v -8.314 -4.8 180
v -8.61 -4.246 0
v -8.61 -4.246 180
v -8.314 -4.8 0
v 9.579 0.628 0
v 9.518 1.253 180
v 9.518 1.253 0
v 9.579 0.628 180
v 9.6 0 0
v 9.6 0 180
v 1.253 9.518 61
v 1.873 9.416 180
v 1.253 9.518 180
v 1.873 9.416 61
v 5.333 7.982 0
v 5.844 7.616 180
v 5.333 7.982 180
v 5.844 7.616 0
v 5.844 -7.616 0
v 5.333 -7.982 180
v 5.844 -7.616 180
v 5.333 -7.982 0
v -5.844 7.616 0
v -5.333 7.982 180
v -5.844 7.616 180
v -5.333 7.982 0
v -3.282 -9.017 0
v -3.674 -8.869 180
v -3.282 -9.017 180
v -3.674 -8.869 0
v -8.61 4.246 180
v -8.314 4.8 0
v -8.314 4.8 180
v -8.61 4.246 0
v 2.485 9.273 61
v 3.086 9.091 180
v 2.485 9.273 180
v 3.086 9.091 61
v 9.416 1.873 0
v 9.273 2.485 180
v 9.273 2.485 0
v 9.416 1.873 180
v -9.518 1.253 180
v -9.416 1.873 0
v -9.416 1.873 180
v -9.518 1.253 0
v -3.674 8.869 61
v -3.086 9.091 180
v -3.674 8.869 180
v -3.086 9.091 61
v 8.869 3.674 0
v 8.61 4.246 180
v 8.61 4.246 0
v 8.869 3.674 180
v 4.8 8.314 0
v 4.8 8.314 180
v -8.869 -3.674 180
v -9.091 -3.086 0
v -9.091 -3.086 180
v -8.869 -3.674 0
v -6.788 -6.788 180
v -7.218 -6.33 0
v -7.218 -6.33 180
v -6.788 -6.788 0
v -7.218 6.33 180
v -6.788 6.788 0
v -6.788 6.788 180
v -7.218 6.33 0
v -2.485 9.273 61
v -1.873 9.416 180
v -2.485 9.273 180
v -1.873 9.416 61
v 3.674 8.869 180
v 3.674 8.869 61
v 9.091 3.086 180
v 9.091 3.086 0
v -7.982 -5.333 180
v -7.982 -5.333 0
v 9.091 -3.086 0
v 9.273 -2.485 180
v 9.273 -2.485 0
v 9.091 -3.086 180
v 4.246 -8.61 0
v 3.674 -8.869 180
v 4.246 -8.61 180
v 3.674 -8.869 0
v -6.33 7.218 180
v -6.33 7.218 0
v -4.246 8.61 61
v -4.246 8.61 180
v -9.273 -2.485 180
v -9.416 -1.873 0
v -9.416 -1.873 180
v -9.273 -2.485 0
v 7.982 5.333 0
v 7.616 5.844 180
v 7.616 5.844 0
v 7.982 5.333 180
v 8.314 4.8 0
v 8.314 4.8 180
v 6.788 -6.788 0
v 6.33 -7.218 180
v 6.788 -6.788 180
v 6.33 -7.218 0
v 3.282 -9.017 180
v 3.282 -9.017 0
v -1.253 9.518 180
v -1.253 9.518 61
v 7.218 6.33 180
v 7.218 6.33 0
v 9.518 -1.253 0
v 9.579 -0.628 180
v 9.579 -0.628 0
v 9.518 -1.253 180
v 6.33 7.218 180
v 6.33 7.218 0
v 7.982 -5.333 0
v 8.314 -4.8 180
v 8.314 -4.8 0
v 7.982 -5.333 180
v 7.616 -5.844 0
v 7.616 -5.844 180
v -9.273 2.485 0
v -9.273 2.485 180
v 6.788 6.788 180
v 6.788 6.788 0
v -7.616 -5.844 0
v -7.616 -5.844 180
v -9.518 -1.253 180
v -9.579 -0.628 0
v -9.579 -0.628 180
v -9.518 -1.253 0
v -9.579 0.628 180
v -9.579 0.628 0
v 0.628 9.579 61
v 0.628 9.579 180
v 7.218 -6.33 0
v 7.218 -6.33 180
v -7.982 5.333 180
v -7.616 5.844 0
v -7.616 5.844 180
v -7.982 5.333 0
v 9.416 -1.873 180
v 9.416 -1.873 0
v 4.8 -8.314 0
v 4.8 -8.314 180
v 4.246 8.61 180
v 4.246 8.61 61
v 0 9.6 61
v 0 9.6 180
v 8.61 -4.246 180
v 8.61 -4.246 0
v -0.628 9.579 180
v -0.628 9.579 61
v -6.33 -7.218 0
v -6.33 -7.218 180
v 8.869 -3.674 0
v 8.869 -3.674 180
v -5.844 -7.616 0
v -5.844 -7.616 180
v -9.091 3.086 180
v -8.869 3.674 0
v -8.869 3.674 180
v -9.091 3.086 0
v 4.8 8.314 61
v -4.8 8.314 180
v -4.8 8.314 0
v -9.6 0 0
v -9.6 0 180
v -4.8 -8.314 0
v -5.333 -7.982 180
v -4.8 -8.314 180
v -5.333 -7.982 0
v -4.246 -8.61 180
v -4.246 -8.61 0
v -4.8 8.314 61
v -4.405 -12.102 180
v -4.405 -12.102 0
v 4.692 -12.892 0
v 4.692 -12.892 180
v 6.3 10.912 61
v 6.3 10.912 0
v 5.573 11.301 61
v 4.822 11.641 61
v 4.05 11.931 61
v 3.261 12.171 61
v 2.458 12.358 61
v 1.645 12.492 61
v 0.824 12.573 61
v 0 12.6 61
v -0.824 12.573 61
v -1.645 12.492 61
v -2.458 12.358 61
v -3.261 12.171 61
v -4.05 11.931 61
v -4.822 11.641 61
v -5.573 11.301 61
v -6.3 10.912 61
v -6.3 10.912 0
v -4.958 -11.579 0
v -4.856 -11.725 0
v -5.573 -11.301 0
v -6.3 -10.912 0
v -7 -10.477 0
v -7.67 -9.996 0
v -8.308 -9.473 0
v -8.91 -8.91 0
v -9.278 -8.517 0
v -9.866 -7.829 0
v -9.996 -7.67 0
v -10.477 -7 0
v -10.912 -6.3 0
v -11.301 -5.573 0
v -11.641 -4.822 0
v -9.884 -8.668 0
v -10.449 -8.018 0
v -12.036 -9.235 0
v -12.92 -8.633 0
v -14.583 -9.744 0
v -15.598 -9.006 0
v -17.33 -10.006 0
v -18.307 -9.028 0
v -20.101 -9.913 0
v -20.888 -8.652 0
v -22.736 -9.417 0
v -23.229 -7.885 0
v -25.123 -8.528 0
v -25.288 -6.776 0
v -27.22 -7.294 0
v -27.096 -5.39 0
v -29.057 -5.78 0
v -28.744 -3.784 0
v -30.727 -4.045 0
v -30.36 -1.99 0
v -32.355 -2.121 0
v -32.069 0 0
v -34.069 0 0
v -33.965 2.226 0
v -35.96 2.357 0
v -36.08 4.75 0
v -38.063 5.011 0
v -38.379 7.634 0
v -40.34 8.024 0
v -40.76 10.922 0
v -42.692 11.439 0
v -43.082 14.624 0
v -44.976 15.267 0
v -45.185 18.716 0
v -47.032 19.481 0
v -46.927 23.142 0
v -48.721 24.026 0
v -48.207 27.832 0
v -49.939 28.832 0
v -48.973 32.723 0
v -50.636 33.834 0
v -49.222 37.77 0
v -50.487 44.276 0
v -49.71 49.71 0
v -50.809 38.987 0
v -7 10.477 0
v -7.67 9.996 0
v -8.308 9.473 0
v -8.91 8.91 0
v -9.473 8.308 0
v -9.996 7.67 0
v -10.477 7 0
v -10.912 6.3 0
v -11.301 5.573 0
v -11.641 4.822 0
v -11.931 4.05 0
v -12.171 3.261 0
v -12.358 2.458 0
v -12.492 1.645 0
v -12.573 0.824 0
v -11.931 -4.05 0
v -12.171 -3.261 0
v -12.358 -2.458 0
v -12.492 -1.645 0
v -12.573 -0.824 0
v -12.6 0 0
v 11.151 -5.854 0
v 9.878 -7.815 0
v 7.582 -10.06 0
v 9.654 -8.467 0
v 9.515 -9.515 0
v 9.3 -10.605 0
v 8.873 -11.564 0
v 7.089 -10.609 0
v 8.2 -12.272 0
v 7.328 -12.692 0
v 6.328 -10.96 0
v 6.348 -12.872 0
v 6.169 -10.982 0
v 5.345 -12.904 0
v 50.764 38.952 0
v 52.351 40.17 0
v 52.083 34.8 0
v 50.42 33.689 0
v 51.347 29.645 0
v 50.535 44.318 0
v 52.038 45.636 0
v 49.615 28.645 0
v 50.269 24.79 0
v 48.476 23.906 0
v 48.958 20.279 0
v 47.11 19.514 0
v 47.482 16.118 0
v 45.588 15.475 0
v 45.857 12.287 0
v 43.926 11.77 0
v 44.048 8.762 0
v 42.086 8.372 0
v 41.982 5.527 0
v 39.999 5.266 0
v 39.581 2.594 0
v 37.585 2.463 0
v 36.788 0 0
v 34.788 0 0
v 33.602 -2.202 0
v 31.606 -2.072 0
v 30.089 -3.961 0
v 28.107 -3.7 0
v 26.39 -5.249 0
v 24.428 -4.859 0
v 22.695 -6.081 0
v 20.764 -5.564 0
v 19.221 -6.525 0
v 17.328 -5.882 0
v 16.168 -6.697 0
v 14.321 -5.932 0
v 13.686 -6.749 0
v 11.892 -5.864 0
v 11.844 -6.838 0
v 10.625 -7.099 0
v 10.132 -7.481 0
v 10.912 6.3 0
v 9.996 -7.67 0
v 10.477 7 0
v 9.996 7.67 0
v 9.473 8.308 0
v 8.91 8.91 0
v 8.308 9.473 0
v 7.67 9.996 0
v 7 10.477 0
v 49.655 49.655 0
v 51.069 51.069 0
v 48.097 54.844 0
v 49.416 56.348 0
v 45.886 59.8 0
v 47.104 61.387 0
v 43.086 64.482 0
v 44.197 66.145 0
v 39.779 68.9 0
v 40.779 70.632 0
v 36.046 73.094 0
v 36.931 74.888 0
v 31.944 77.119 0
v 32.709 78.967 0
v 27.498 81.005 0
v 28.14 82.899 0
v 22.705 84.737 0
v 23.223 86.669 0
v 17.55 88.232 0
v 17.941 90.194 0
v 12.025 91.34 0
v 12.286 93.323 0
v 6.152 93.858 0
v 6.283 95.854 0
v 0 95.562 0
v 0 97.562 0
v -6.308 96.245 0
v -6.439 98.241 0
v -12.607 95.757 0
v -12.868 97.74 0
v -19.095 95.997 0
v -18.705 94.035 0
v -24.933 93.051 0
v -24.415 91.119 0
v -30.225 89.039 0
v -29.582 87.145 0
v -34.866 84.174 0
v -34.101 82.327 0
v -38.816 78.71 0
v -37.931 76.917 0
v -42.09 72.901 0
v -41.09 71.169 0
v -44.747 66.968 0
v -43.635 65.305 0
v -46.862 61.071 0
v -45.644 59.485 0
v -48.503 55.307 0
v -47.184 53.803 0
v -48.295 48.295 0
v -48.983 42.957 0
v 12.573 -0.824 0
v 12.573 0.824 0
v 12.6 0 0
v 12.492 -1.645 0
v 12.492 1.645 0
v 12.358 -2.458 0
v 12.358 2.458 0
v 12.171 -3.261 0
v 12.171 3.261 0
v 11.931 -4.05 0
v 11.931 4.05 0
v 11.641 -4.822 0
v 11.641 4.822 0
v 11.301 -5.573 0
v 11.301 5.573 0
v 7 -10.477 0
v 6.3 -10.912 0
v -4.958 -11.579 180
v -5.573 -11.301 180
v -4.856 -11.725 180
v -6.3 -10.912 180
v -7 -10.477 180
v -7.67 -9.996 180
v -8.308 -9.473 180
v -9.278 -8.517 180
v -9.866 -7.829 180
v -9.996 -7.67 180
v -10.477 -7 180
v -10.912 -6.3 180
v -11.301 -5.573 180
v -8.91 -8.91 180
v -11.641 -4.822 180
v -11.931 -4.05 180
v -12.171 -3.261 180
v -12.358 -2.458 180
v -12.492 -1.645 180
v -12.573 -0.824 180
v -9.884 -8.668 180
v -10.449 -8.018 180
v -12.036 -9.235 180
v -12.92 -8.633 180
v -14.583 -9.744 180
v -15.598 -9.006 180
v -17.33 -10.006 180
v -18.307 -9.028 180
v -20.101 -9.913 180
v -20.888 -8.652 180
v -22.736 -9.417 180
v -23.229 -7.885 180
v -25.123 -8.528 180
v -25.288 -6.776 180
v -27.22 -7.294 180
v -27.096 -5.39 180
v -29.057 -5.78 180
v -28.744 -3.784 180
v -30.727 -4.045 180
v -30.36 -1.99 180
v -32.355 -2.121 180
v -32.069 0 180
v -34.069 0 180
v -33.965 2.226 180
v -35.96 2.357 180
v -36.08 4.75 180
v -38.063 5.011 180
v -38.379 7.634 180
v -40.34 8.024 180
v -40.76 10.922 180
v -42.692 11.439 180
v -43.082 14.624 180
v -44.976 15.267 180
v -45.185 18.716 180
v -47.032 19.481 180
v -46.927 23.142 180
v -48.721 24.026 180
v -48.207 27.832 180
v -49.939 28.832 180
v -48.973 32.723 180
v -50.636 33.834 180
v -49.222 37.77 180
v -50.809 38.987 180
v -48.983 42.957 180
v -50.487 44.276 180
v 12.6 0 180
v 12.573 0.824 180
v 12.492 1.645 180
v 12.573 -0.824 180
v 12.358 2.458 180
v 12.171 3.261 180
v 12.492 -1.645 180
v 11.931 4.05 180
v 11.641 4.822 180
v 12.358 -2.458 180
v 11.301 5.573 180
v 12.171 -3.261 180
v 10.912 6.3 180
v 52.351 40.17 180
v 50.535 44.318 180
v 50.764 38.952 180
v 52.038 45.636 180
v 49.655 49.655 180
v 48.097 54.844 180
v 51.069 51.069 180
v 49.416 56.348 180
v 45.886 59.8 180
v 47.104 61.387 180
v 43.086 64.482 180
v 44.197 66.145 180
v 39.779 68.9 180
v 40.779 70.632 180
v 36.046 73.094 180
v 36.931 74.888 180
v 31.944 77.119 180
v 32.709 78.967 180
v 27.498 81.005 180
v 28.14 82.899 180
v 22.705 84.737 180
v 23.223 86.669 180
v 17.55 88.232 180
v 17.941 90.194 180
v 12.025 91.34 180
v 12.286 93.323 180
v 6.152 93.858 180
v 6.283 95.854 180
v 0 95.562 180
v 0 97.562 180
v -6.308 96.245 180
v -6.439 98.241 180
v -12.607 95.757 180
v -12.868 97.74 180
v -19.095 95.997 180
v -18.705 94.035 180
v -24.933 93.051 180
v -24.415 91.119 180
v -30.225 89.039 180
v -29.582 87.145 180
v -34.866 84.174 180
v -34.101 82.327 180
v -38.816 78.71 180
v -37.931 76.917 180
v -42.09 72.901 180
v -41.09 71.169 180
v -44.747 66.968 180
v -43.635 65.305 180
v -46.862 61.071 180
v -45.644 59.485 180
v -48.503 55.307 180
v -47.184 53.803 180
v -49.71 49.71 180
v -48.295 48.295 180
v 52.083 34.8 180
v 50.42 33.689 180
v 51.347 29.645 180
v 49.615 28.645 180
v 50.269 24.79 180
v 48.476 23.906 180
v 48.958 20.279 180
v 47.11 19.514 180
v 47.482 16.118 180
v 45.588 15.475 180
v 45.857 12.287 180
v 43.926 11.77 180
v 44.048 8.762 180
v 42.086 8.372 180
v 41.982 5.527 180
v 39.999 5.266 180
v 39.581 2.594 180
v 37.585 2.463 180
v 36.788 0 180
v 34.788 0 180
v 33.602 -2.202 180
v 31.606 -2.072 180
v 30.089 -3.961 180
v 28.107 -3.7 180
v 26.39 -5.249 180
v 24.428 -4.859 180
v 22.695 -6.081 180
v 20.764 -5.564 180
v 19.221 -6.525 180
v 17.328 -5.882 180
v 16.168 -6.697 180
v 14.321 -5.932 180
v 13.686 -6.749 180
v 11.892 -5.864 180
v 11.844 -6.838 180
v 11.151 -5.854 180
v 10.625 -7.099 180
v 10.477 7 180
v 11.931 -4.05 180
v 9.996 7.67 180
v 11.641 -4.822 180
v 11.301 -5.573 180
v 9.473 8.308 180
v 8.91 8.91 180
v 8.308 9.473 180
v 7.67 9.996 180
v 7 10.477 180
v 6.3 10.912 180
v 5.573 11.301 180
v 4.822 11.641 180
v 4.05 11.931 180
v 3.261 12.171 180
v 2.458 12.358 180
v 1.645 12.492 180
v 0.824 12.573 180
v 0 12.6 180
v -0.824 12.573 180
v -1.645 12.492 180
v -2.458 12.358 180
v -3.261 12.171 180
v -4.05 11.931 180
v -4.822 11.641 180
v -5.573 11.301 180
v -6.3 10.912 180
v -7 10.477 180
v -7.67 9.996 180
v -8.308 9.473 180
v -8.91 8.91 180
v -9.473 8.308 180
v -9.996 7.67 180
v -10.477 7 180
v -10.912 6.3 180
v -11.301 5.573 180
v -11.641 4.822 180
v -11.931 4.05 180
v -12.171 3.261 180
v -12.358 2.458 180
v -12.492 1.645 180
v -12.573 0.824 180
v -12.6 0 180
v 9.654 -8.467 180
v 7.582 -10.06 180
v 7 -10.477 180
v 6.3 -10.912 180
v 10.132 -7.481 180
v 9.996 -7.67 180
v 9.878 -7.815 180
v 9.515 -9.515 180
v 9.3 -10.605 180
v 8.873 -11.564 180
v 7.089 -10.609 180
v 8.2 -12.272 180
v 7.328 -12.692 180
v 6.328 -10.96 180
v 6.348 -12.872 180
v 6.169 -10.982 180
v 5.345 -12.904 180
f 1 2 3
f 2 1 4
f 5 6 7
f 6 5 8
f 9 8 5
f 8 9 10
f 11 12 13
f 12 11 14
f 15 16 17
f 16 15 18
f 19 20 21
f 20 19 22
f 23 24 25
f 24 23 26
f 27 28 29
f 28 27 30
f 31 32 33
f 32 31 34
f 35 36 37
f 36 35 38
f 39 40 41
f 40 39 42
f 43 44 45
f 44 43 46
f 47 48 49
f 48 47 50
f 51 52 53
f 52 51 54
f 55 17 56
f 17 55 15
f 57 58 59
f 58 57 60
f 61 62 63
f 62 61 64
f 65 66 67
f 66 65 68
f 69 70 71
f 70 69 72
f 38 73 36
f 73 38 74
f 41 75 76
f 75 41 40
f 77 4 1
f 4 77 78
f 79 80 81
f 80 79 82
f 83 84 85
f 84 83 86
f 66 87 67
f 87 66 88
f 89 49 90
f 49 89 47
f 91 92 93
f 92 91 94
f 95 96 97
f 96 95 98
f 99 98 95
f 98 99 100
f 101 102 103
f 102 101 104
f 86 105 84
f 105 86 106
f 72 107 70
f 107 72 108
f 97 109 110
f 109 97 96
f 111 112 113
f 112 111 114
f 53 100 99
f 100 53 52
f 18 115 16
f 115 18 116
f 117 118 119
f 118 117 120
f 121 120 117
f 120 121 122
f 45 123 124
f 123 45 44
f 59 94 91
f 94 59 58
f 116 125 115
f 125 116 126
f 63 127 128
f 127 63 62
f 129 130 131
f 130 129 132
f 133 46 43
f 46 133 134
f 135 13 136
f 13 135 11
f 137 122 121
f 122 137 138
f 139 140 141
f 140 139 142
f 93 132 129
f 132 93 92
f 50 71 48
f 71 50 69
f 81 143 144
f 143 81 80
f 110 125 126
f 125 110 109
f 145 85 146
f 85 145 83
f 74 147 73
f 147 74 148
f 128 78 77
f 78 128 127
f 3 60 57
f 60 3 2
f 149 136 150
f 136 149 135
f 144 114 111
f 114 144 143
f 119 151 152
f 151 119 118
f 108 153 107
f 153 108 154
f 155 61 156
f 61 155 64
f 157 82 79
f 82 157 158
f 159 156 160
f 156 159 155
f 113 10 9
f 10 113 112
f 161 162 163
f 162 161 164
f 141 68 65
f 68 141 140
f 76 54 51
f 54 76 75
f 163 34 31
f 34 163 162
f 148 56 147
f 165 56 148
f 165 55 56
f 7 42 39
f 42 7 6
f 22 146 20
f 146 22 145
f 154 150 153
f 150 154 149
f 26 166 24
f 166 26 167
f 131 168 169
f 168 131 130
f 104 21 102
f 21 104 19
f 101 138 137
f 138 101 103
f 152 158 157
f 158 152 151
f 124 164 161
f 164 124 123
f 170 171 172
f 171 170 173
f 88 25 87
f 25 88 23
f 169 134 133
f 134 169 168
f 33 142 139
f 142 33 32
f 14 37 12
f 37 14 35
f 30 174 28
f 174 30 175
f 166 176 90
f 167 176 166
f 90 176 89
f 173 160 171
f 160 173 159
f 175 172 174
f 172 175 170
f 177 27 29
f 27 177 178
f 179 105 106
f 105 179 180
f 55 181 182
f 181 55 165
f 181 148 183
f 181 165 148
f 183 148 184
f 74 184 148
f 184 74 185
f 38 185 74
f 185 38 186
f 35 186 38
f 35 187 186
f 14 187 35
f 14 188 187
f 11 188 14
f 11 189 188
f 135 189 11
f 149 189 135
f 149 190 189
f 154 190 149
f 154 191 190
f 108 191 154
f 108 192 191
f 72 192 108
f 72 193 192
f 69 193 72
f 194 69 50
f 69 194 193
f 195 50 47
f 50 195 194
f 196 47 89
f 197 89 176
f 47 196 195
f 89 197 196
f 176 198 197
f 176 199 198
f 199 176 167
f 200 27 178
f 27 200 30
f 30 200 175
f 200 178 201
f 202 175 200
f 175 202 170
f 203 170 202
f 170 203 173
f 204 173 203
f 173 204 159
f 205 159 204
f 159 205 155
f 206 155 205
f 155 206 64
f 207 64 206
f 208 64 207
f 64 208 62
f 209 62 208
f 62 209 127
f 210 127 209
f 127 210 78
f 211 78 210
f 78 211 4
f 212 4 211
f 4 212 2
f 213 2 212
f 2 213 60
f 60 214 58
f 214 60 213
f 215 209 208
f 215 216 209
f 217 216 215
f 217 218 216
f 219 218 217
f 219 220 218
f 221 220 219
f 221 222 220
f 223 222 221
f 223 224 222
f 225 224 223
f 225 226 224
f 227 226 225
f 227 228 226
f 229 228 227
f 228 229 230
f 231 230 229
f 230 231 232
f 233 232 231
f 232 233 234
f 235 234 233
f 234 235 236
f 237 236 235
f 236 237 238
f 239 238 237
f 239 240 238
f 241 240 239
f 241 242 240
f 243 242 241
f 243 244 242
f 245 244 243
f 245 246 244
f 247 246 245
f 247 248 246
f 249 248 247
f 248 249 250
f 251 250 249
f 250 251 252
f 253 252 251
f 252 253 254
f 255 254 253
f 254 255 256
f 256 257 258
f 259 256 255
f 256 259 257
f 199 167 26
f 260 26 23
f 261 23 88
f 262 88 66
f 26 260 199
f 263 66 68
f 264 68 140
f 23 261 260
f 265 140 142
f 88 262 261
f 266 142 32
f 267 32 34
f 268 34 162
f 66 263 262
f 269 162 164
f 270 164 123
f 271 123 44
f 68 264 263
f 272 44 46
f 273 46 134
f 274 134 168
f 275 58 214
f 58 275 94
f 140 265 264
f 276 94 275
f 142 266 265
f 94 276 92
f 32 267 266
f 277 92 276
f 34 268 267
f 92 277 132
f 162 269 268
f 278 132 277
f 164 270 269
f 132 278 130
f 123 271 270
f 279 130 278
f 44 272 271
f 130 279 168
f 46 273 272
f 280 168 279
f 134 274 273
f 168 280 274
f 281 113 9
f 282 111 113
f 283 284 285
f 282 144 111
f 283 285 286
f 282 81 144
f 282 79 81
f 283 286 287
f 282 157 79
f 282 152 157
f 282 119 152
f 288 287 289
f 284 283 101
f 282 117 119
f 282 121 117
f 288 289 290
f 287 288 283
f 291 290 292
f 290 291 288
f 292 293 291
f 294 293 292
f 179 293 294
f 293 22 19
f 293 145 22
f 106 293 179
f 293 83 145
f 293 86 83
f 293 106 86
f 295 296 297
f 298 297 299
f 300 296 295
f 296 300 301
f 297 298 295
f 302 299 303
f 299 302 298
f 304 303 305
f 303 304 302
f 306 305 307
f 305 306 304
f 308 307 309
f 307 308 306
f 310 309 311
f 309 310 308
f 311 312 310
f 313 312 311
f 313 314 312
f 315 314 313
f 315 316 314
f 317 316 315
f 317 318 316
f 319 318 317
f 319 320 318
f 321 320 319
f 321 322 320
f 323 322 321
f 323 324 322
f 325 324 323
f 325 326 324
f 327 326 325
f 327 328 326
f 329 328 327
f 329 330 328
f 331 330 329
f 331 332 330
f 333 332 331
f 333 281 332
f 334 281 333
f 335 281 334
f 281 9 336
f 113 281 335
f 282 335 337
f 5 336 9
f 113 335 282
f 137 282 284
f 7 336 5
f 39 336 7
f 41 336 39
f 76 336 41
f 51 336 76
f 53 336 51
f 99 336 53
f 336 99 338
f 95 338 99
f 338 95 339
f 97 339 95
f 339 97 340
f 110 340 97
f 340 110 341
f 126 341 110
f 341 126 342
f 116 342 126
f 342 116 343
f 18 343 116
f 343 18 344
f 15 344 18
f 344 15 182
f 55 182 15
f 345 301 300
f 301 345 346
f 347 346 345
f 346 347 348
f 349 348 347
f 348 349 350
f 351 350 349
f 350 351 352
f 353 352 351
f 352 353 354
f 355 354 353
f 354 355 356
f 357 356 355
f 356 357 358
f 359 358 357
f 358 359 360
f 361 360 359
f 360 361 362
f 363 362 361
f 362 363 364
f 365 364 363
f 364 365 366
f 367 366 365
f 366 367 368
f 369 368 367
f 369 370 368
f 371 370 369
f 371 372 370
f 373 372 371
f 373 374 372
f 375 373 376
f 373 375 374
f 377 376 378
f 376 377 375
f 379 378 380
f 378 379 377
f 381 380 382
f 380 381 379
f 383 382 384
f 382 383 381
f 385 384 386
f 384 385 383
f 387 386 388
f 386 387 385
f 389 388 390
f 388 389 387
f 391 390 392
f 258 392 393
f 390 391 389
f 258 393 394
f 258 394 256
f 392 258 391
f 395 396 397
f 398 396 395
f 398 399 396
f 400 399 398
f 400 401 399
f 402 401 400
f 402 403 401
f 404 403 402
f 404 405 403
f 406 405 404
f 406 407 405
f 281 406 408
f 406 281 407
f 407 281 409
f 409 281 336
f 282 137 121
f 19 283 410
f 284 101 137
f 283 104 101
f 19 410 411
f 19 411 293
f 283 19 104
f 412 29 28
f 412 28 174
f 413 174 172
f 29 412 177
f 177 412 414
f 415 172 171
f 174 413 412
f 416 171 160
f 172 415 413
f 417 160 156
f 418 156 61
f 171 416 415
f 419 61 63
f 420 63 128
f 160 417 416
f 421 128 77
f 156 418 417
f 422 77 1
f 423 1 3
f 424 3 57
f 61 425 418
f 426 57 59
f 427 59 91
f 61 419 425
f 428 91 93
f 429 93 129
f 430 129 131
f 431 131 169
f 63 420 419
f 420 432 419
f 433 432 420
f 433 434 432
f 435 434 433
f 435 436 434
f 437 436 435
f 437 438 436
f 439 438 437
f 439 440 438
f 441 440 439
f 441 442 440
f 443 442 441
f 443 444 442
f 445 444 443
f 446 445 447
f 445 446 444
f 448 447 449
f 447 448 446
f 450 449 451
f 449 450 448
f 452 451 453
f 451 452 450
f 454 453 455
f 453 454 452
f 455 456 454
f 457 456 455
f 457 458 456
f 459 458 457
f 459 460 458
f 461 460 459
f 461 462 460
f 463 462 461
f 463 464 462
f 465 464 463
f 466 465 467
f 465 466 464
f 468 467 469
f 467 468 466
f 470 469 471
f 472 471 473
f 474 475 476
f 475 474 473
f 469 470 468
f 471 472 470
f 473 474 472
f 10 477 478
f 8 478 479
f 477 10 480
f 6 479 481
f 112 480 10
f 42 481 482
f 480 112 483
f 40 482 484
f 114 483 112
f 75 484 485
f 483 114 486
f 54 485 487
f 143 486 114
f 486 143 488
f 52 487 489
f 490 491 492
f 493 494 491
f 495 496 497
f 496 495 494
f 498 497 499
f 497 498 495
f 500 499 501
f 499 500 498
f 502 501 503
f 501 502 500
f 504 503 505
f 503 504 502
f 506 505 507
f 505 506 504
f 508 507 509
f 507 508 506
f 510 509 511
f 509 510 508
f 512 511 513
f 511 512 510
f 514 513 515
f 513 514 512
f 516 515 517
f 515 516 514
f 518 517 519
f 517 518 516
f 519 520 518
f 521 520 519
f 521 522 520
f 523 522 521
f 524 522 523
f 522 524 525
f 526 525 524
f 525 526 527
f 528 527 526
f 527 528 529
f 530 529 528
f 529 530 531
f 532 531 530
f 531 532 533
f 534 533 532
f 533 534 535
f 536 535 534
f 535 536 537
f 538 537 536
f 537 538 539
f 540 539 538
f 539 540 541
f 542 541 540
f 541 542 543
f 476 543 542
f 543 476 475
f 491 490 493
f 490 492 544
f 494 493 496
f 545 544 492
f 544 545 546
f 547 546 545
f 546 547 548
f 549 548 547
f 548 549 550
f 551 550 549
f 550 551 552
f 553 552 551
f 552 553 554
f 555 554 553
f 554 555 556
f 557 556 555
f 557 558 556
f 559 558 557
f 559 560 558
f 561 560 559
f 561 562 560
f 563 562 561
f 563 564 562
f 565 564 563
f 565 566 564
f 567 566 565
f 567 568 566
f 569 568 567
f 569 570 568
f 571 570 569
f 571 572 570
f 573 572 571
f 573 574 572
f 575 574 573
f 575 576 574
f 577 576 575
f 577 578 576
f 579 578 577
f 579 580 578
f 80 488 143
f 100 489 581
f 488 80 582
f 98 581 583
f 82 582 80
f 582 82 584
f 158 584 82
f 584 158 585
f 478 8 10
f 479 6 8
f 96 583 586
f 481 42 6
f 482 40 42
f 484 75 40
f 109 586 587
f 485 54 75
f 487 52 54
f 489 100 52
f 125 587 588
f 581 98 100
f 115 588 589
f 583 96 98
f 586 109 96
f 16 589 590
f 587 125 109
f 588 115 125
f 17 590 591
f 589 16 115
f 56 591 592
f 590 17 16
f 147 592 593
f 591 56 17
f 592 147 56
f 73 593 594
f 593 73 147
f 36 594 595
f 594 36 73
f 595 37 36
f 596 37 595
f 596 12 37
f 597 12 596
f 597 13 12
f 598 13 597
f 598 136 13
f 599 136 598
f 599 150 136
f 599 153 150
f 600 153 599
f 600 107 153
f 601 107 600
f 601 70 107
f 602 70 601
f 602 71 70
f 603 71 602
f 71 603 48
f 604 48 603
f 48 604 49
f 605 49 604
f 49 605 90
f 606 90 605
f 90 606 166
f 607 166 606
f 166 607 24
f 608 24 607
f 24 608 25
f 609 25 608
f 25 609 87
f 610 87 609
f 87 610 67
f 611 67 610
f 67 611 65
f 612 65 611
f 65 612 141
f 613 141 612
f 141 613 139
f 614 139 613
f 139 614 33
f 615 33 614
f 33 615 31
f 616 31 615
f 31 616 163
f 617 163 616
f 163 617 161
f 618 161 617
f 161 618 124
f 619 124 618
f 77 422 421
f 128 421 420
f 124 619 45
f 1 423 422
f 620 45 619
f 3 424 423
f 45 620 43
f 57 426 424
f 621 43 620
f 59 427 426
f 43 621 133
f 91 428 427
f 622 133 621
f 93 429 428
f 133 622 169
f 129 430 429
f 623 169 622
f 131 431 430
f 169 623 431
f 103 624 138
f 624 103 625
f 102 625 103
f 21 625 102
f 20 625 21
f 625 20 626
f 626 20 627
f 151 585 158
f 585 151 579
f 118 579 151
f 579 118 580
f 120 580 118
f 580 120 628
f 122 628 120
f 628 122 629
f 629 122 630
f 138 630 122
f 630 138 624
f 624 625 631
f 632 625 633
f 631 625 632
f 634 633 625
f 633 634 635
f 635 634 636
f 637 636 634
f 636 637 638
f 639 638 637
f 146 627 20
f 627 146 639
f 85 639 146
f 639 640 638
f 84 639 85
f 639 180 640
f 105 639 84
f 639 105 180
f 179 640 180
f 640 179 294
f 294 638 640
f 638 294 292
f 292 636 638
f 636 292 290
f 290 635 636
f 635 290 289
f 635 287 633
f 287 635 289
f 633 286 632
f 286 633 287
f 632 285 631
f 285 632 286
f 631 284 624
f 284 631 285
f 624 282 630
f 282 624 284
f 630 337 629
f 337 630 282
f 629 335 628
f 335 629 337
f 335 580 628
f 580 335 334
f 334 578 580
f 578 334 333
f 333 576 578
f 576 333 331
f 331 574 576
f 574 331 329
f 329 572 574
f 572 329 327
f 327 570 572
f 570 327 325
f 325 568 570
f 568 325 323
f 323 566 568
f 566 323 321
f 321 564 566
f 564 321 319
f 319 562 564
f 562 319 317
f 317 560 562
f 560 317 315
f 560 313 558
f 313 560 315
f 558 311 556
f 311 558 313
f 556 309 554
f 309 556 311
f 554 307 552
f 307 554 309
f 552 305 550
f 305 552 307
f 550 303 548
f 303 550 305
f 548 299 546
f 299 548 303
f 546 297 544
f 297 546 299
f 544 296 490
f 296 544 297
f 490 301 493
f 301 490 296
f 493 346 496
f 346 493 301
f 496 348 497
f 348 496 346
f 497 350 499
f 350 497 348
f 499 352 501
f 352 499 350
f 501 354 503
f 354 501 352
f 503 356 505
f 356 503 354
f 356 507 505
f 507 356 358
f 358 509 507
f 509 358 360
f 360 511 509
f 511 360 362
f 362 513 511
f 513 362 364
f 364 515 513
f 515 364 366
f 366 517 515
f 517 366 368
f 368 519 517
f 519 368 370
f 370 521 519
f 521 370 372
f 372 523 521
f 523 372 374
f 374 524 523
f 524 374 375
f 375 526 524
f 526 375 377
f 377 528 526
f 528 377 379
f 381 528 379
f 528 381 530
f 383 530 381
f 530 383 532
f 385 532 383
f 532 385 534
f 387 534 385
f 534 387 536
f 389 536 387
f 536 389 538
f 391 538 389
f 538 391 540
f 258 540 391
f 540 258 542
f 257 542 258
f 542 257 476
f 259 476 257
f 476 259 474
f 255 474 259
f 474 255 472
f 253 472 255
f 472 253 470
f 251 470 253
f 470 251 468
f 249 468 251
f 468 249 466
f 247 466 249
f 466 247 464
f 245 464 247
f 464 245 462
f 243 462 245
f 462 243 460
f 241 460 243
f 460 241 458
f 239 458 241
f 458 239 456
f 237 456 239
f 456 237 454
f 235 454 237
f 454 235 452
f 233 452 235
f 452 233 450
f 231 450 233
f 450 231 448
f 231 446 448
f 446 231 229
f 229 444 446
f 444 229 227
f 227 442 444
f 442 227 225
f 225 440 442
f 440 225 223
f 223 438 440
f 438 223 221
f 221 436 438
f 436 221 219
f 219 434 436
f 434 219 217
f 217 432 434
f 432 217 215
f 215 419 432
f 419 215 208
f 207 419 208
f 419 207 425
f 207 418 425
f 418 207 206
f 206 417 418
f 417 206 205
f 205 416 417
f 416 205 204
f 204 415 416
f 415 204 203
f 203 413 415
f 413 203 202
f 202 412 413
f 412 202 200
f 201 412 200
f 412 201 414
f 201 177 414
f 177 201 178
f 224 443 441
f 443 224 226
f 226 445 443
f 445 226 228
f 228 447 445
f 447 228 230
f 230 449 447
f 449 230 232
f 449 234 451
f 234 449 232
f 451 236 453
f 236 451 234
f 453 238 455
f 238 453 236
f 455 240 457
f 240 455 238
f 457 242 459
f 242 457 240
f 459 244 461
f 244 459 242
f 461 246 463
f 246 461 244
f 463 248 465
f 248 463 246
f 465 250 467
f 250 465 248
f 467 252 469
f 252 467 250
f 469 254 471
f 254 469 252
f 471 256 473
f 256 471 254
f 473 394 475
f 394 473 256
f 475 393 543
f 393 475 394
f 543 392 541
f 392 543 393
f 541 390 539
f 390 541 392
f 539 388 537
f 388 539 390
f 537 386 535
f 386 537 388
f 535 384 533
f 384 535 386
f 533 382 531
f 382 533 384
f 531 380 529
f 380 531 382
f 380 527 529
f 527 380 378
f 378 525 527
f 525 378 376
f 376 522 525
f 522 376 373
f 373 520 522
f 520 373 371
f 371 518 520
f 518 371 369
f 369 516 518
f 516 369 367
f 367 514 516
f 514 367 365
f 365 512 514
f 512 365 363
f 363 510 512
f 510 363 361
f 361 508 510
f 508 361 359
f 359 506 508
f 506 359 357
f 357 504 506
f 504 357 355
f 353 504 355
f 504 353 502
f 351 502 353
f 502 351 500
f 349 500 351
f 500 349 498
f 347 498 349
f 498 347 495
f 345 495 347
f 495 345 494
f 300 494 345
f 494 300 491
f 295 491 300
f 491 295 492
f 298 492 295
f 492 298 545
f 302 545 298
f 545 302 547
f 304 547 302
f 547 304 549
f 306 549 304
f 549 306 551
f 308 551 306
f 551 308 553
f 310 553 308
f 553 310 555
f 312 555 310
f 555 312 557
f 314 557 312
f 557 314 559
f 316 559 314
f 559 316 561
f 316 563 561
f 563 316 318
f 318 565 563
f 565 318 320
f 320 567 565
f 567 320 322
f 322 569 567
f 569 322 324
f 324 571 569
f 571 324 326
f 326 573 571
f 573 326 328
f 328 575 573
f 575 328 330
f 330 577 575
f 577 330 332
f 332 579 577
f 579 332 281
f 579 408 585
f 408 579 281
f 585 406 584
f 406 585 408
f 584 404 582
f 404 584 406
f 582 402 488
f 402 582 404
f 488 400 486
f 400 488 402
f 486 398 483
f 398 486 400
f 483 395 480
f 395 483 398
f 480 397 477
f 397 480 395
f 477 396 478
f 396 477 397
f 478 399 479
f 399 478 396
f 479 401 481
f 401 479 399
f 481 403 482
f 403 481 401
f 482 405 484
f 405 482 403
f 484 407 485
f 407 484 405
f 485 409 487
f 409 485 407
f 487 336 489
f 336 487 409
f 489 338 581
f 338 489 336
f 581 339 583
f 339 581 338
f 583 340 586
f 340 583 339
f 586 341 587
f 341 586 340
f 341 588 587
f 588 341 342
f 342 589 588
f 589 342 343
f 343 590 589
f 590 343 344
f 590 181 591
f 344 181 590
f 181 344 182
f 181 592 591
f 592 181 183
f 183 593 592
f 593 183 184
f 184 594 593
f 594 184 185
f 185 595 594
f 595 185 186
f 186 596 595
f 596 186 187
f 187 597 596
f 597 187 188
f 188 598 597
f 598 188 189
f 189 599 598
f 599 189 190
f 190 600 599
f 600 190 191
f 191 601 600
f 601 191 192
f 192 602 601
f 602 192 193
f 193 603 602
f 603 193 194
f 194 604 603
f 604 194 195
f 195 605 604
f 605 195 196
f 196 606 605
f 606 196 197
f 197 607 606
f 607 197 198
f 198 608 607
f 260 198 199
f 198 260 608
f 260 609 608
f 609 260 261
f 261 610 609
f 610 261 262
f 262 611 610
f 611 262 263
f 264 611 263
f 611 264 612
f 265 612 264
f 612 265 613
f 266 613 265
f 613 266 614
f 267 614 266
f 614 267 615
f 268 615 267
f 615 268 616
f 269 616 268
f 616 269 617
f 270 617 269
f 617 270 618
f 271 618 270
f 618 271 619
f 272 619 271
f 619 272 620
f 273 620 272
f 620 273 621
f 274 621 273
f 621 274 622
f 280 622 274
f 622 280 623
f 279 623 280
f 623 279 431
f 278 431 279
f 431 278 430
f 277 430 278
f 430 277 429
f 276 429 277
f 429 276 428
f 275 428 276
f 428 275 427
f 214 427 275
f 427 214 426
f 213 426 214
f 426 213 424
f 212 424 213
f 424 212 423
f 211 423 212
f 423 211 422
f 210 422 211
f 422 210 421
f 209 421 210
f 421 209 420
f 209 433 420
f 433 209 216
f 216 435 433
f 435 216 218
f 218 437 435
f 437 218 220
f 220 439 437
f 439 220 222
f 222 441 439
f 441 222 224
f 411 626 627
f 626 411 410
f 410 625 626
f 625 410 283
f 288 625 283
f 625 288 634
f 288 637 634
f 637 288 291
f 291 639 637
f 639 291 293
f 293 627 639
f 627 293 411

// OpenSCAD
// Lampenschirm für Stehlampe – organischer, wellenförmiger Querschnitt
// mit Klemmkragen, der in die Form integriert ist (keine D-Form mehr)
// Alle Maße in Millimetern (Regel: units-mm)
//
// Kontext: context/printer.md, context/tolerances.md und context/materials.md
// waren zum Zeitpunkt der Modellierung leer (siehe Regel: context-first).
// Annahmen aus dem Design-Dialog (siehe auch 001/002):
//   - Baubett >= 200mm Z-Höhe vorhanden -> Schirm wird als ein Teil,
//     stehend, in voller Höhe gedruckt.
//   - Klemmkragen als offener Federclip (C-Ring): Innendurchmesser 0.8mm
//     unter Stangendurchmesser (19.2mm ID auf 20mm Stange) für Vorspannung.
//   - E14-Fassung wird separat an der Stange montiert.
//
// Änderungen gegenüber 008 (Nutzer-Feedback: kleine Schlaufen-Artefakte an
// der Kontur nahe der Klemme, rechte Seite wieder nicht sauber verbunden):
//   - Ursache gefunden per Winkel-Sweep (siehe scratchpad-Analyse): die
//     Wellen-Amplitude (6mm/3mm) war trotz Hüllkurve immer noch groß genug,
//     um den Radius nahe der Rückseite nicht nur einmal, sondern zweimal
//     die Verbindungs-Grenze kreuzen zu lassen (erst raus, dann wieder weit
//     rein bis zum harten Minimum) - dieses "Doppel-Kreuzen" erzeugt beim
//     Verschneiden mit dem kreisrunden Klemmkragen eine sichtbare Schlaufe/
//     Einbuchtung statt eines glatten Übergangs.
//   - Fix: Wellen-Amplitude auf 3mm/1.5mm halbiert. Per Winkel-Sweep (0.25°-
//     Schritte, volle 360°) geprüft: die Kontur bleibt jetzt sanft und
//     einfach (keine Doppel-Kreuzungen mehr in der kritischen Zone um die
//     Klemme).

// ---- Parameter ----
shade_height = 180;   // Gesamthöhe des Schirms
wall_t       = 2;     // Wandstärke Schirm (durchgehend, auch am Klemmkragen-Übergang)

rod_d      = 20;                 // Durchmesser der Metallstange
rod_r      = rod_d / 2;
clip_id    = 19.2;               // Innendurchmesser Klemmkragen (Vorspannung, ~0.8mm Untermaß)
clip_r_in  = clip_id / 2;
clip_wall  = 3;                  // Wandstärke Klemmkragen (dicker als Schirmwand, für Klemmkraft)
clip_r_out = clip_r_in + clip_wall;
clip_gap_deg = 40;               // Öffnungswinkel des C-Rings (Montagespalt, zeigt nach -Y)

socket_slot_deg    = 60;              // Öffnungswinkel des Fassungs-Schlitzes (Innenseite, +Y) - Annahme
socket_slot_height = shade_height / 3; // unteres Drittel der Klemme ist auf der Innenseite offen

// Organische Grundform: Potenzfunktion statt Fourier-Reihe, damit die
// Rückseite (θ=270°) über einen breiten Winkelbereich flach bleibt, statt
// steil anzusteigen.
back_r  = 13;     // Zielradius an der Rückseite (θ=270°) - eng am Klemmkragen
front_r = 95;      // Zielradius an der Front (θ=90°)
flatten_power = 2; // höher = flacherer/breiterer "Hals" um die Klemme, aber schmalere Seiten

// Wellen-Überlagerung für den organischen/wellenförmigen Look (Front/Seiten) -
// bewusst moderat, damit die Kontur nahe der Klemme nicht mehrfach kreuzt
wave_amp1 = 3;   wave_freq1 = 4;  wave_phase1 = 40;
wave_amp2 = 1.5; wave_freq2 = 7;  wave_phase2 = 115;
wave_fade_width = 55;   // Welle erreicht erst ab diesem Winkelabstand von der Rückseite volle Stärke

// Harter Sicherheits-Deckel: garantiert, dass die Kontur nahe der Rückseite
// den Klemmkragen nie verfehlt, unabhängig von der Wellenphase
neck_guard_width = 20;                     // Winkelbereich, in dem der Deckel aktiv ist
max_neck_r = clip_r_out + wall_t - 0.3;    // = 14.3mm, garantiert Überlappung mit Sicherheitsabstand
min_r      = clip_r_out - 1;               // globale Untergrenze (Reserve, verhindert Radius <= 0 / Bohrung)

cut_far = 300;   // "unendlich" großer Radius für Schnitte, die garantiert bis nach außen durchbrechen sollen

$fn = 96;

// Winkelabstand zwischen theta und center (0-180°, robust über den 0°/360°-Übergang)
function angle_diff(theta, center) =
    let(d = abs(theta - center))
    (d > 180) ? 360 - d : d;

// Hüllkurve 0 (direkt an der Rückseite) bis 1 (ab wave_fade_width Grad Abstand)
function wave_envelope(theta) =
    let(d = angle_diff(theta, 270))
    (d >= wave_fade_width) ? 1 : (1 - cos(180 * d / wave_fade_width)) / 2;

// Radius der organischen Kontur in Abhängigkeit vom Winkel θ (Grad)
function organic_r(theta) =
    let(phi = theta - 90)
    let(u = (1 + cos(phi)) / 2)   // 0 an der Rückseite (θ=270°), 1 an der Front (θ=90°)
    let(base = back_r + (front_r - back_r) * pow(u, flatten_power))
    let(raw_wave = wave_amp1 * sin(wave_freq1 * theta + wave_phase1)
                 + wave_amp2 * sin(wave_freq2 * theta + wave_phase2))
    let(wave = raw_wave * wave_envelope(theta))
    let(r_free = base + wave)
    let(d = angle_diff(theta, 270))
    let(r_guarded = (d < neck_guard_width) ? min(r_free, max_neck_r) : r_free)
    max(r_guarded, min_r);

// Geschlossenes 2D-Profil der organischen Kontur, um shrink (mm) nach innen
// verkleinert (shrink=0 -> Außenkontur, shrink=wall_t -> Innenkontur).
// Direkte Radius-Berechnung statt offset() - robust bei welliger Kontur.
module organic_outline(shrink = 0) {
    step = 360 / $fn;
    polygon(points = [
        for (t = [0 : step : 360 - step])
            [(organic_r(t) - shrink) * cos(t), (organic_r(t) - shrink) * sin(t)]
    ]);
}

// Keilförmiger 2D-Ausschnitt, zentriert auf Winkel 0
module pie_wedge_2d(radius, angle_deg) {
    a = angle_deg / 2;
    polygon(points = [
        [0, 0],
        [radius * cos(a), radius * sin(a)],
        [radius * cos(-a), radius * sin(-a)]
    ]);
}

// Voller Klemmkragen-Rohling (Bohrung/Spalt werden erst in 3D herausgeschnitten).
// Überlappt an der Rückseite direkt mit der Innenkontur der Schirmwand.
module collar_disk_2d() {
    circle(r = clip_r_out);
}

// 2D-Profil der Wand: durchgehend wall_t dick, plus Klemmkragen-Rohling
module shell_with_boss_2d() {
    union() {
        difference() {
            organic_outline(0);
            organic_outline(wall_t);
        }
        collar_disk_2d();
    }
}

module organic_shell() {
    linear_extrude(height = shade_height)
        shell_with_boss_2d();
}

// Radialer Schlitz von z0 bis z1, in Richtung facing_deg ausgerichtet
module radial_slot(radius, angle_deg, facing_deg, z0, z1) {
    translate([0, 0, z0])
        rotate([0, 0, facing_deg])
            linear_extrude(z1 - z0)
                pie_wedge_2d(radius, angle_deg);
}

// Alle Ausschnitte für die Klemme: durchgehende Stangenbohrung + Montagespalt
// (volle Höhe, -Y, bricht bis zur echten Außenwand durch, damit seitlich
// eingeclipst werden kann) + Fassungs-Schlitz (unteres Drittel, +Y, öffnet
// nur bis in den ohnehin dort schon hohlen Innenraum)
module clamp_cutouts() {
    union() {
        translate([0, 0, -1])
            cylinder(r = clip_r_in, h = shade_height + 2);

        radial_slot(cut_far, clip_gap_deg, 270, -1, shade_height + 1);

        radial_slot(clip_r_out + 5, socket_slot_deg, 90, -1, socket_slot_height + 1);
    }
}

// render() erzwingt die vollständige (exakte) Boolesche Berechnung statt der
// schnellen OpenCSG-Live-Vorschau, damit die Klemme auch in der OpenSCAD-
// Vorschau (F5) korrekt dargestellt wird.
render(convexity = 10)
    difference() {
        organic_shell();
        clamp_cutouts();
    }
